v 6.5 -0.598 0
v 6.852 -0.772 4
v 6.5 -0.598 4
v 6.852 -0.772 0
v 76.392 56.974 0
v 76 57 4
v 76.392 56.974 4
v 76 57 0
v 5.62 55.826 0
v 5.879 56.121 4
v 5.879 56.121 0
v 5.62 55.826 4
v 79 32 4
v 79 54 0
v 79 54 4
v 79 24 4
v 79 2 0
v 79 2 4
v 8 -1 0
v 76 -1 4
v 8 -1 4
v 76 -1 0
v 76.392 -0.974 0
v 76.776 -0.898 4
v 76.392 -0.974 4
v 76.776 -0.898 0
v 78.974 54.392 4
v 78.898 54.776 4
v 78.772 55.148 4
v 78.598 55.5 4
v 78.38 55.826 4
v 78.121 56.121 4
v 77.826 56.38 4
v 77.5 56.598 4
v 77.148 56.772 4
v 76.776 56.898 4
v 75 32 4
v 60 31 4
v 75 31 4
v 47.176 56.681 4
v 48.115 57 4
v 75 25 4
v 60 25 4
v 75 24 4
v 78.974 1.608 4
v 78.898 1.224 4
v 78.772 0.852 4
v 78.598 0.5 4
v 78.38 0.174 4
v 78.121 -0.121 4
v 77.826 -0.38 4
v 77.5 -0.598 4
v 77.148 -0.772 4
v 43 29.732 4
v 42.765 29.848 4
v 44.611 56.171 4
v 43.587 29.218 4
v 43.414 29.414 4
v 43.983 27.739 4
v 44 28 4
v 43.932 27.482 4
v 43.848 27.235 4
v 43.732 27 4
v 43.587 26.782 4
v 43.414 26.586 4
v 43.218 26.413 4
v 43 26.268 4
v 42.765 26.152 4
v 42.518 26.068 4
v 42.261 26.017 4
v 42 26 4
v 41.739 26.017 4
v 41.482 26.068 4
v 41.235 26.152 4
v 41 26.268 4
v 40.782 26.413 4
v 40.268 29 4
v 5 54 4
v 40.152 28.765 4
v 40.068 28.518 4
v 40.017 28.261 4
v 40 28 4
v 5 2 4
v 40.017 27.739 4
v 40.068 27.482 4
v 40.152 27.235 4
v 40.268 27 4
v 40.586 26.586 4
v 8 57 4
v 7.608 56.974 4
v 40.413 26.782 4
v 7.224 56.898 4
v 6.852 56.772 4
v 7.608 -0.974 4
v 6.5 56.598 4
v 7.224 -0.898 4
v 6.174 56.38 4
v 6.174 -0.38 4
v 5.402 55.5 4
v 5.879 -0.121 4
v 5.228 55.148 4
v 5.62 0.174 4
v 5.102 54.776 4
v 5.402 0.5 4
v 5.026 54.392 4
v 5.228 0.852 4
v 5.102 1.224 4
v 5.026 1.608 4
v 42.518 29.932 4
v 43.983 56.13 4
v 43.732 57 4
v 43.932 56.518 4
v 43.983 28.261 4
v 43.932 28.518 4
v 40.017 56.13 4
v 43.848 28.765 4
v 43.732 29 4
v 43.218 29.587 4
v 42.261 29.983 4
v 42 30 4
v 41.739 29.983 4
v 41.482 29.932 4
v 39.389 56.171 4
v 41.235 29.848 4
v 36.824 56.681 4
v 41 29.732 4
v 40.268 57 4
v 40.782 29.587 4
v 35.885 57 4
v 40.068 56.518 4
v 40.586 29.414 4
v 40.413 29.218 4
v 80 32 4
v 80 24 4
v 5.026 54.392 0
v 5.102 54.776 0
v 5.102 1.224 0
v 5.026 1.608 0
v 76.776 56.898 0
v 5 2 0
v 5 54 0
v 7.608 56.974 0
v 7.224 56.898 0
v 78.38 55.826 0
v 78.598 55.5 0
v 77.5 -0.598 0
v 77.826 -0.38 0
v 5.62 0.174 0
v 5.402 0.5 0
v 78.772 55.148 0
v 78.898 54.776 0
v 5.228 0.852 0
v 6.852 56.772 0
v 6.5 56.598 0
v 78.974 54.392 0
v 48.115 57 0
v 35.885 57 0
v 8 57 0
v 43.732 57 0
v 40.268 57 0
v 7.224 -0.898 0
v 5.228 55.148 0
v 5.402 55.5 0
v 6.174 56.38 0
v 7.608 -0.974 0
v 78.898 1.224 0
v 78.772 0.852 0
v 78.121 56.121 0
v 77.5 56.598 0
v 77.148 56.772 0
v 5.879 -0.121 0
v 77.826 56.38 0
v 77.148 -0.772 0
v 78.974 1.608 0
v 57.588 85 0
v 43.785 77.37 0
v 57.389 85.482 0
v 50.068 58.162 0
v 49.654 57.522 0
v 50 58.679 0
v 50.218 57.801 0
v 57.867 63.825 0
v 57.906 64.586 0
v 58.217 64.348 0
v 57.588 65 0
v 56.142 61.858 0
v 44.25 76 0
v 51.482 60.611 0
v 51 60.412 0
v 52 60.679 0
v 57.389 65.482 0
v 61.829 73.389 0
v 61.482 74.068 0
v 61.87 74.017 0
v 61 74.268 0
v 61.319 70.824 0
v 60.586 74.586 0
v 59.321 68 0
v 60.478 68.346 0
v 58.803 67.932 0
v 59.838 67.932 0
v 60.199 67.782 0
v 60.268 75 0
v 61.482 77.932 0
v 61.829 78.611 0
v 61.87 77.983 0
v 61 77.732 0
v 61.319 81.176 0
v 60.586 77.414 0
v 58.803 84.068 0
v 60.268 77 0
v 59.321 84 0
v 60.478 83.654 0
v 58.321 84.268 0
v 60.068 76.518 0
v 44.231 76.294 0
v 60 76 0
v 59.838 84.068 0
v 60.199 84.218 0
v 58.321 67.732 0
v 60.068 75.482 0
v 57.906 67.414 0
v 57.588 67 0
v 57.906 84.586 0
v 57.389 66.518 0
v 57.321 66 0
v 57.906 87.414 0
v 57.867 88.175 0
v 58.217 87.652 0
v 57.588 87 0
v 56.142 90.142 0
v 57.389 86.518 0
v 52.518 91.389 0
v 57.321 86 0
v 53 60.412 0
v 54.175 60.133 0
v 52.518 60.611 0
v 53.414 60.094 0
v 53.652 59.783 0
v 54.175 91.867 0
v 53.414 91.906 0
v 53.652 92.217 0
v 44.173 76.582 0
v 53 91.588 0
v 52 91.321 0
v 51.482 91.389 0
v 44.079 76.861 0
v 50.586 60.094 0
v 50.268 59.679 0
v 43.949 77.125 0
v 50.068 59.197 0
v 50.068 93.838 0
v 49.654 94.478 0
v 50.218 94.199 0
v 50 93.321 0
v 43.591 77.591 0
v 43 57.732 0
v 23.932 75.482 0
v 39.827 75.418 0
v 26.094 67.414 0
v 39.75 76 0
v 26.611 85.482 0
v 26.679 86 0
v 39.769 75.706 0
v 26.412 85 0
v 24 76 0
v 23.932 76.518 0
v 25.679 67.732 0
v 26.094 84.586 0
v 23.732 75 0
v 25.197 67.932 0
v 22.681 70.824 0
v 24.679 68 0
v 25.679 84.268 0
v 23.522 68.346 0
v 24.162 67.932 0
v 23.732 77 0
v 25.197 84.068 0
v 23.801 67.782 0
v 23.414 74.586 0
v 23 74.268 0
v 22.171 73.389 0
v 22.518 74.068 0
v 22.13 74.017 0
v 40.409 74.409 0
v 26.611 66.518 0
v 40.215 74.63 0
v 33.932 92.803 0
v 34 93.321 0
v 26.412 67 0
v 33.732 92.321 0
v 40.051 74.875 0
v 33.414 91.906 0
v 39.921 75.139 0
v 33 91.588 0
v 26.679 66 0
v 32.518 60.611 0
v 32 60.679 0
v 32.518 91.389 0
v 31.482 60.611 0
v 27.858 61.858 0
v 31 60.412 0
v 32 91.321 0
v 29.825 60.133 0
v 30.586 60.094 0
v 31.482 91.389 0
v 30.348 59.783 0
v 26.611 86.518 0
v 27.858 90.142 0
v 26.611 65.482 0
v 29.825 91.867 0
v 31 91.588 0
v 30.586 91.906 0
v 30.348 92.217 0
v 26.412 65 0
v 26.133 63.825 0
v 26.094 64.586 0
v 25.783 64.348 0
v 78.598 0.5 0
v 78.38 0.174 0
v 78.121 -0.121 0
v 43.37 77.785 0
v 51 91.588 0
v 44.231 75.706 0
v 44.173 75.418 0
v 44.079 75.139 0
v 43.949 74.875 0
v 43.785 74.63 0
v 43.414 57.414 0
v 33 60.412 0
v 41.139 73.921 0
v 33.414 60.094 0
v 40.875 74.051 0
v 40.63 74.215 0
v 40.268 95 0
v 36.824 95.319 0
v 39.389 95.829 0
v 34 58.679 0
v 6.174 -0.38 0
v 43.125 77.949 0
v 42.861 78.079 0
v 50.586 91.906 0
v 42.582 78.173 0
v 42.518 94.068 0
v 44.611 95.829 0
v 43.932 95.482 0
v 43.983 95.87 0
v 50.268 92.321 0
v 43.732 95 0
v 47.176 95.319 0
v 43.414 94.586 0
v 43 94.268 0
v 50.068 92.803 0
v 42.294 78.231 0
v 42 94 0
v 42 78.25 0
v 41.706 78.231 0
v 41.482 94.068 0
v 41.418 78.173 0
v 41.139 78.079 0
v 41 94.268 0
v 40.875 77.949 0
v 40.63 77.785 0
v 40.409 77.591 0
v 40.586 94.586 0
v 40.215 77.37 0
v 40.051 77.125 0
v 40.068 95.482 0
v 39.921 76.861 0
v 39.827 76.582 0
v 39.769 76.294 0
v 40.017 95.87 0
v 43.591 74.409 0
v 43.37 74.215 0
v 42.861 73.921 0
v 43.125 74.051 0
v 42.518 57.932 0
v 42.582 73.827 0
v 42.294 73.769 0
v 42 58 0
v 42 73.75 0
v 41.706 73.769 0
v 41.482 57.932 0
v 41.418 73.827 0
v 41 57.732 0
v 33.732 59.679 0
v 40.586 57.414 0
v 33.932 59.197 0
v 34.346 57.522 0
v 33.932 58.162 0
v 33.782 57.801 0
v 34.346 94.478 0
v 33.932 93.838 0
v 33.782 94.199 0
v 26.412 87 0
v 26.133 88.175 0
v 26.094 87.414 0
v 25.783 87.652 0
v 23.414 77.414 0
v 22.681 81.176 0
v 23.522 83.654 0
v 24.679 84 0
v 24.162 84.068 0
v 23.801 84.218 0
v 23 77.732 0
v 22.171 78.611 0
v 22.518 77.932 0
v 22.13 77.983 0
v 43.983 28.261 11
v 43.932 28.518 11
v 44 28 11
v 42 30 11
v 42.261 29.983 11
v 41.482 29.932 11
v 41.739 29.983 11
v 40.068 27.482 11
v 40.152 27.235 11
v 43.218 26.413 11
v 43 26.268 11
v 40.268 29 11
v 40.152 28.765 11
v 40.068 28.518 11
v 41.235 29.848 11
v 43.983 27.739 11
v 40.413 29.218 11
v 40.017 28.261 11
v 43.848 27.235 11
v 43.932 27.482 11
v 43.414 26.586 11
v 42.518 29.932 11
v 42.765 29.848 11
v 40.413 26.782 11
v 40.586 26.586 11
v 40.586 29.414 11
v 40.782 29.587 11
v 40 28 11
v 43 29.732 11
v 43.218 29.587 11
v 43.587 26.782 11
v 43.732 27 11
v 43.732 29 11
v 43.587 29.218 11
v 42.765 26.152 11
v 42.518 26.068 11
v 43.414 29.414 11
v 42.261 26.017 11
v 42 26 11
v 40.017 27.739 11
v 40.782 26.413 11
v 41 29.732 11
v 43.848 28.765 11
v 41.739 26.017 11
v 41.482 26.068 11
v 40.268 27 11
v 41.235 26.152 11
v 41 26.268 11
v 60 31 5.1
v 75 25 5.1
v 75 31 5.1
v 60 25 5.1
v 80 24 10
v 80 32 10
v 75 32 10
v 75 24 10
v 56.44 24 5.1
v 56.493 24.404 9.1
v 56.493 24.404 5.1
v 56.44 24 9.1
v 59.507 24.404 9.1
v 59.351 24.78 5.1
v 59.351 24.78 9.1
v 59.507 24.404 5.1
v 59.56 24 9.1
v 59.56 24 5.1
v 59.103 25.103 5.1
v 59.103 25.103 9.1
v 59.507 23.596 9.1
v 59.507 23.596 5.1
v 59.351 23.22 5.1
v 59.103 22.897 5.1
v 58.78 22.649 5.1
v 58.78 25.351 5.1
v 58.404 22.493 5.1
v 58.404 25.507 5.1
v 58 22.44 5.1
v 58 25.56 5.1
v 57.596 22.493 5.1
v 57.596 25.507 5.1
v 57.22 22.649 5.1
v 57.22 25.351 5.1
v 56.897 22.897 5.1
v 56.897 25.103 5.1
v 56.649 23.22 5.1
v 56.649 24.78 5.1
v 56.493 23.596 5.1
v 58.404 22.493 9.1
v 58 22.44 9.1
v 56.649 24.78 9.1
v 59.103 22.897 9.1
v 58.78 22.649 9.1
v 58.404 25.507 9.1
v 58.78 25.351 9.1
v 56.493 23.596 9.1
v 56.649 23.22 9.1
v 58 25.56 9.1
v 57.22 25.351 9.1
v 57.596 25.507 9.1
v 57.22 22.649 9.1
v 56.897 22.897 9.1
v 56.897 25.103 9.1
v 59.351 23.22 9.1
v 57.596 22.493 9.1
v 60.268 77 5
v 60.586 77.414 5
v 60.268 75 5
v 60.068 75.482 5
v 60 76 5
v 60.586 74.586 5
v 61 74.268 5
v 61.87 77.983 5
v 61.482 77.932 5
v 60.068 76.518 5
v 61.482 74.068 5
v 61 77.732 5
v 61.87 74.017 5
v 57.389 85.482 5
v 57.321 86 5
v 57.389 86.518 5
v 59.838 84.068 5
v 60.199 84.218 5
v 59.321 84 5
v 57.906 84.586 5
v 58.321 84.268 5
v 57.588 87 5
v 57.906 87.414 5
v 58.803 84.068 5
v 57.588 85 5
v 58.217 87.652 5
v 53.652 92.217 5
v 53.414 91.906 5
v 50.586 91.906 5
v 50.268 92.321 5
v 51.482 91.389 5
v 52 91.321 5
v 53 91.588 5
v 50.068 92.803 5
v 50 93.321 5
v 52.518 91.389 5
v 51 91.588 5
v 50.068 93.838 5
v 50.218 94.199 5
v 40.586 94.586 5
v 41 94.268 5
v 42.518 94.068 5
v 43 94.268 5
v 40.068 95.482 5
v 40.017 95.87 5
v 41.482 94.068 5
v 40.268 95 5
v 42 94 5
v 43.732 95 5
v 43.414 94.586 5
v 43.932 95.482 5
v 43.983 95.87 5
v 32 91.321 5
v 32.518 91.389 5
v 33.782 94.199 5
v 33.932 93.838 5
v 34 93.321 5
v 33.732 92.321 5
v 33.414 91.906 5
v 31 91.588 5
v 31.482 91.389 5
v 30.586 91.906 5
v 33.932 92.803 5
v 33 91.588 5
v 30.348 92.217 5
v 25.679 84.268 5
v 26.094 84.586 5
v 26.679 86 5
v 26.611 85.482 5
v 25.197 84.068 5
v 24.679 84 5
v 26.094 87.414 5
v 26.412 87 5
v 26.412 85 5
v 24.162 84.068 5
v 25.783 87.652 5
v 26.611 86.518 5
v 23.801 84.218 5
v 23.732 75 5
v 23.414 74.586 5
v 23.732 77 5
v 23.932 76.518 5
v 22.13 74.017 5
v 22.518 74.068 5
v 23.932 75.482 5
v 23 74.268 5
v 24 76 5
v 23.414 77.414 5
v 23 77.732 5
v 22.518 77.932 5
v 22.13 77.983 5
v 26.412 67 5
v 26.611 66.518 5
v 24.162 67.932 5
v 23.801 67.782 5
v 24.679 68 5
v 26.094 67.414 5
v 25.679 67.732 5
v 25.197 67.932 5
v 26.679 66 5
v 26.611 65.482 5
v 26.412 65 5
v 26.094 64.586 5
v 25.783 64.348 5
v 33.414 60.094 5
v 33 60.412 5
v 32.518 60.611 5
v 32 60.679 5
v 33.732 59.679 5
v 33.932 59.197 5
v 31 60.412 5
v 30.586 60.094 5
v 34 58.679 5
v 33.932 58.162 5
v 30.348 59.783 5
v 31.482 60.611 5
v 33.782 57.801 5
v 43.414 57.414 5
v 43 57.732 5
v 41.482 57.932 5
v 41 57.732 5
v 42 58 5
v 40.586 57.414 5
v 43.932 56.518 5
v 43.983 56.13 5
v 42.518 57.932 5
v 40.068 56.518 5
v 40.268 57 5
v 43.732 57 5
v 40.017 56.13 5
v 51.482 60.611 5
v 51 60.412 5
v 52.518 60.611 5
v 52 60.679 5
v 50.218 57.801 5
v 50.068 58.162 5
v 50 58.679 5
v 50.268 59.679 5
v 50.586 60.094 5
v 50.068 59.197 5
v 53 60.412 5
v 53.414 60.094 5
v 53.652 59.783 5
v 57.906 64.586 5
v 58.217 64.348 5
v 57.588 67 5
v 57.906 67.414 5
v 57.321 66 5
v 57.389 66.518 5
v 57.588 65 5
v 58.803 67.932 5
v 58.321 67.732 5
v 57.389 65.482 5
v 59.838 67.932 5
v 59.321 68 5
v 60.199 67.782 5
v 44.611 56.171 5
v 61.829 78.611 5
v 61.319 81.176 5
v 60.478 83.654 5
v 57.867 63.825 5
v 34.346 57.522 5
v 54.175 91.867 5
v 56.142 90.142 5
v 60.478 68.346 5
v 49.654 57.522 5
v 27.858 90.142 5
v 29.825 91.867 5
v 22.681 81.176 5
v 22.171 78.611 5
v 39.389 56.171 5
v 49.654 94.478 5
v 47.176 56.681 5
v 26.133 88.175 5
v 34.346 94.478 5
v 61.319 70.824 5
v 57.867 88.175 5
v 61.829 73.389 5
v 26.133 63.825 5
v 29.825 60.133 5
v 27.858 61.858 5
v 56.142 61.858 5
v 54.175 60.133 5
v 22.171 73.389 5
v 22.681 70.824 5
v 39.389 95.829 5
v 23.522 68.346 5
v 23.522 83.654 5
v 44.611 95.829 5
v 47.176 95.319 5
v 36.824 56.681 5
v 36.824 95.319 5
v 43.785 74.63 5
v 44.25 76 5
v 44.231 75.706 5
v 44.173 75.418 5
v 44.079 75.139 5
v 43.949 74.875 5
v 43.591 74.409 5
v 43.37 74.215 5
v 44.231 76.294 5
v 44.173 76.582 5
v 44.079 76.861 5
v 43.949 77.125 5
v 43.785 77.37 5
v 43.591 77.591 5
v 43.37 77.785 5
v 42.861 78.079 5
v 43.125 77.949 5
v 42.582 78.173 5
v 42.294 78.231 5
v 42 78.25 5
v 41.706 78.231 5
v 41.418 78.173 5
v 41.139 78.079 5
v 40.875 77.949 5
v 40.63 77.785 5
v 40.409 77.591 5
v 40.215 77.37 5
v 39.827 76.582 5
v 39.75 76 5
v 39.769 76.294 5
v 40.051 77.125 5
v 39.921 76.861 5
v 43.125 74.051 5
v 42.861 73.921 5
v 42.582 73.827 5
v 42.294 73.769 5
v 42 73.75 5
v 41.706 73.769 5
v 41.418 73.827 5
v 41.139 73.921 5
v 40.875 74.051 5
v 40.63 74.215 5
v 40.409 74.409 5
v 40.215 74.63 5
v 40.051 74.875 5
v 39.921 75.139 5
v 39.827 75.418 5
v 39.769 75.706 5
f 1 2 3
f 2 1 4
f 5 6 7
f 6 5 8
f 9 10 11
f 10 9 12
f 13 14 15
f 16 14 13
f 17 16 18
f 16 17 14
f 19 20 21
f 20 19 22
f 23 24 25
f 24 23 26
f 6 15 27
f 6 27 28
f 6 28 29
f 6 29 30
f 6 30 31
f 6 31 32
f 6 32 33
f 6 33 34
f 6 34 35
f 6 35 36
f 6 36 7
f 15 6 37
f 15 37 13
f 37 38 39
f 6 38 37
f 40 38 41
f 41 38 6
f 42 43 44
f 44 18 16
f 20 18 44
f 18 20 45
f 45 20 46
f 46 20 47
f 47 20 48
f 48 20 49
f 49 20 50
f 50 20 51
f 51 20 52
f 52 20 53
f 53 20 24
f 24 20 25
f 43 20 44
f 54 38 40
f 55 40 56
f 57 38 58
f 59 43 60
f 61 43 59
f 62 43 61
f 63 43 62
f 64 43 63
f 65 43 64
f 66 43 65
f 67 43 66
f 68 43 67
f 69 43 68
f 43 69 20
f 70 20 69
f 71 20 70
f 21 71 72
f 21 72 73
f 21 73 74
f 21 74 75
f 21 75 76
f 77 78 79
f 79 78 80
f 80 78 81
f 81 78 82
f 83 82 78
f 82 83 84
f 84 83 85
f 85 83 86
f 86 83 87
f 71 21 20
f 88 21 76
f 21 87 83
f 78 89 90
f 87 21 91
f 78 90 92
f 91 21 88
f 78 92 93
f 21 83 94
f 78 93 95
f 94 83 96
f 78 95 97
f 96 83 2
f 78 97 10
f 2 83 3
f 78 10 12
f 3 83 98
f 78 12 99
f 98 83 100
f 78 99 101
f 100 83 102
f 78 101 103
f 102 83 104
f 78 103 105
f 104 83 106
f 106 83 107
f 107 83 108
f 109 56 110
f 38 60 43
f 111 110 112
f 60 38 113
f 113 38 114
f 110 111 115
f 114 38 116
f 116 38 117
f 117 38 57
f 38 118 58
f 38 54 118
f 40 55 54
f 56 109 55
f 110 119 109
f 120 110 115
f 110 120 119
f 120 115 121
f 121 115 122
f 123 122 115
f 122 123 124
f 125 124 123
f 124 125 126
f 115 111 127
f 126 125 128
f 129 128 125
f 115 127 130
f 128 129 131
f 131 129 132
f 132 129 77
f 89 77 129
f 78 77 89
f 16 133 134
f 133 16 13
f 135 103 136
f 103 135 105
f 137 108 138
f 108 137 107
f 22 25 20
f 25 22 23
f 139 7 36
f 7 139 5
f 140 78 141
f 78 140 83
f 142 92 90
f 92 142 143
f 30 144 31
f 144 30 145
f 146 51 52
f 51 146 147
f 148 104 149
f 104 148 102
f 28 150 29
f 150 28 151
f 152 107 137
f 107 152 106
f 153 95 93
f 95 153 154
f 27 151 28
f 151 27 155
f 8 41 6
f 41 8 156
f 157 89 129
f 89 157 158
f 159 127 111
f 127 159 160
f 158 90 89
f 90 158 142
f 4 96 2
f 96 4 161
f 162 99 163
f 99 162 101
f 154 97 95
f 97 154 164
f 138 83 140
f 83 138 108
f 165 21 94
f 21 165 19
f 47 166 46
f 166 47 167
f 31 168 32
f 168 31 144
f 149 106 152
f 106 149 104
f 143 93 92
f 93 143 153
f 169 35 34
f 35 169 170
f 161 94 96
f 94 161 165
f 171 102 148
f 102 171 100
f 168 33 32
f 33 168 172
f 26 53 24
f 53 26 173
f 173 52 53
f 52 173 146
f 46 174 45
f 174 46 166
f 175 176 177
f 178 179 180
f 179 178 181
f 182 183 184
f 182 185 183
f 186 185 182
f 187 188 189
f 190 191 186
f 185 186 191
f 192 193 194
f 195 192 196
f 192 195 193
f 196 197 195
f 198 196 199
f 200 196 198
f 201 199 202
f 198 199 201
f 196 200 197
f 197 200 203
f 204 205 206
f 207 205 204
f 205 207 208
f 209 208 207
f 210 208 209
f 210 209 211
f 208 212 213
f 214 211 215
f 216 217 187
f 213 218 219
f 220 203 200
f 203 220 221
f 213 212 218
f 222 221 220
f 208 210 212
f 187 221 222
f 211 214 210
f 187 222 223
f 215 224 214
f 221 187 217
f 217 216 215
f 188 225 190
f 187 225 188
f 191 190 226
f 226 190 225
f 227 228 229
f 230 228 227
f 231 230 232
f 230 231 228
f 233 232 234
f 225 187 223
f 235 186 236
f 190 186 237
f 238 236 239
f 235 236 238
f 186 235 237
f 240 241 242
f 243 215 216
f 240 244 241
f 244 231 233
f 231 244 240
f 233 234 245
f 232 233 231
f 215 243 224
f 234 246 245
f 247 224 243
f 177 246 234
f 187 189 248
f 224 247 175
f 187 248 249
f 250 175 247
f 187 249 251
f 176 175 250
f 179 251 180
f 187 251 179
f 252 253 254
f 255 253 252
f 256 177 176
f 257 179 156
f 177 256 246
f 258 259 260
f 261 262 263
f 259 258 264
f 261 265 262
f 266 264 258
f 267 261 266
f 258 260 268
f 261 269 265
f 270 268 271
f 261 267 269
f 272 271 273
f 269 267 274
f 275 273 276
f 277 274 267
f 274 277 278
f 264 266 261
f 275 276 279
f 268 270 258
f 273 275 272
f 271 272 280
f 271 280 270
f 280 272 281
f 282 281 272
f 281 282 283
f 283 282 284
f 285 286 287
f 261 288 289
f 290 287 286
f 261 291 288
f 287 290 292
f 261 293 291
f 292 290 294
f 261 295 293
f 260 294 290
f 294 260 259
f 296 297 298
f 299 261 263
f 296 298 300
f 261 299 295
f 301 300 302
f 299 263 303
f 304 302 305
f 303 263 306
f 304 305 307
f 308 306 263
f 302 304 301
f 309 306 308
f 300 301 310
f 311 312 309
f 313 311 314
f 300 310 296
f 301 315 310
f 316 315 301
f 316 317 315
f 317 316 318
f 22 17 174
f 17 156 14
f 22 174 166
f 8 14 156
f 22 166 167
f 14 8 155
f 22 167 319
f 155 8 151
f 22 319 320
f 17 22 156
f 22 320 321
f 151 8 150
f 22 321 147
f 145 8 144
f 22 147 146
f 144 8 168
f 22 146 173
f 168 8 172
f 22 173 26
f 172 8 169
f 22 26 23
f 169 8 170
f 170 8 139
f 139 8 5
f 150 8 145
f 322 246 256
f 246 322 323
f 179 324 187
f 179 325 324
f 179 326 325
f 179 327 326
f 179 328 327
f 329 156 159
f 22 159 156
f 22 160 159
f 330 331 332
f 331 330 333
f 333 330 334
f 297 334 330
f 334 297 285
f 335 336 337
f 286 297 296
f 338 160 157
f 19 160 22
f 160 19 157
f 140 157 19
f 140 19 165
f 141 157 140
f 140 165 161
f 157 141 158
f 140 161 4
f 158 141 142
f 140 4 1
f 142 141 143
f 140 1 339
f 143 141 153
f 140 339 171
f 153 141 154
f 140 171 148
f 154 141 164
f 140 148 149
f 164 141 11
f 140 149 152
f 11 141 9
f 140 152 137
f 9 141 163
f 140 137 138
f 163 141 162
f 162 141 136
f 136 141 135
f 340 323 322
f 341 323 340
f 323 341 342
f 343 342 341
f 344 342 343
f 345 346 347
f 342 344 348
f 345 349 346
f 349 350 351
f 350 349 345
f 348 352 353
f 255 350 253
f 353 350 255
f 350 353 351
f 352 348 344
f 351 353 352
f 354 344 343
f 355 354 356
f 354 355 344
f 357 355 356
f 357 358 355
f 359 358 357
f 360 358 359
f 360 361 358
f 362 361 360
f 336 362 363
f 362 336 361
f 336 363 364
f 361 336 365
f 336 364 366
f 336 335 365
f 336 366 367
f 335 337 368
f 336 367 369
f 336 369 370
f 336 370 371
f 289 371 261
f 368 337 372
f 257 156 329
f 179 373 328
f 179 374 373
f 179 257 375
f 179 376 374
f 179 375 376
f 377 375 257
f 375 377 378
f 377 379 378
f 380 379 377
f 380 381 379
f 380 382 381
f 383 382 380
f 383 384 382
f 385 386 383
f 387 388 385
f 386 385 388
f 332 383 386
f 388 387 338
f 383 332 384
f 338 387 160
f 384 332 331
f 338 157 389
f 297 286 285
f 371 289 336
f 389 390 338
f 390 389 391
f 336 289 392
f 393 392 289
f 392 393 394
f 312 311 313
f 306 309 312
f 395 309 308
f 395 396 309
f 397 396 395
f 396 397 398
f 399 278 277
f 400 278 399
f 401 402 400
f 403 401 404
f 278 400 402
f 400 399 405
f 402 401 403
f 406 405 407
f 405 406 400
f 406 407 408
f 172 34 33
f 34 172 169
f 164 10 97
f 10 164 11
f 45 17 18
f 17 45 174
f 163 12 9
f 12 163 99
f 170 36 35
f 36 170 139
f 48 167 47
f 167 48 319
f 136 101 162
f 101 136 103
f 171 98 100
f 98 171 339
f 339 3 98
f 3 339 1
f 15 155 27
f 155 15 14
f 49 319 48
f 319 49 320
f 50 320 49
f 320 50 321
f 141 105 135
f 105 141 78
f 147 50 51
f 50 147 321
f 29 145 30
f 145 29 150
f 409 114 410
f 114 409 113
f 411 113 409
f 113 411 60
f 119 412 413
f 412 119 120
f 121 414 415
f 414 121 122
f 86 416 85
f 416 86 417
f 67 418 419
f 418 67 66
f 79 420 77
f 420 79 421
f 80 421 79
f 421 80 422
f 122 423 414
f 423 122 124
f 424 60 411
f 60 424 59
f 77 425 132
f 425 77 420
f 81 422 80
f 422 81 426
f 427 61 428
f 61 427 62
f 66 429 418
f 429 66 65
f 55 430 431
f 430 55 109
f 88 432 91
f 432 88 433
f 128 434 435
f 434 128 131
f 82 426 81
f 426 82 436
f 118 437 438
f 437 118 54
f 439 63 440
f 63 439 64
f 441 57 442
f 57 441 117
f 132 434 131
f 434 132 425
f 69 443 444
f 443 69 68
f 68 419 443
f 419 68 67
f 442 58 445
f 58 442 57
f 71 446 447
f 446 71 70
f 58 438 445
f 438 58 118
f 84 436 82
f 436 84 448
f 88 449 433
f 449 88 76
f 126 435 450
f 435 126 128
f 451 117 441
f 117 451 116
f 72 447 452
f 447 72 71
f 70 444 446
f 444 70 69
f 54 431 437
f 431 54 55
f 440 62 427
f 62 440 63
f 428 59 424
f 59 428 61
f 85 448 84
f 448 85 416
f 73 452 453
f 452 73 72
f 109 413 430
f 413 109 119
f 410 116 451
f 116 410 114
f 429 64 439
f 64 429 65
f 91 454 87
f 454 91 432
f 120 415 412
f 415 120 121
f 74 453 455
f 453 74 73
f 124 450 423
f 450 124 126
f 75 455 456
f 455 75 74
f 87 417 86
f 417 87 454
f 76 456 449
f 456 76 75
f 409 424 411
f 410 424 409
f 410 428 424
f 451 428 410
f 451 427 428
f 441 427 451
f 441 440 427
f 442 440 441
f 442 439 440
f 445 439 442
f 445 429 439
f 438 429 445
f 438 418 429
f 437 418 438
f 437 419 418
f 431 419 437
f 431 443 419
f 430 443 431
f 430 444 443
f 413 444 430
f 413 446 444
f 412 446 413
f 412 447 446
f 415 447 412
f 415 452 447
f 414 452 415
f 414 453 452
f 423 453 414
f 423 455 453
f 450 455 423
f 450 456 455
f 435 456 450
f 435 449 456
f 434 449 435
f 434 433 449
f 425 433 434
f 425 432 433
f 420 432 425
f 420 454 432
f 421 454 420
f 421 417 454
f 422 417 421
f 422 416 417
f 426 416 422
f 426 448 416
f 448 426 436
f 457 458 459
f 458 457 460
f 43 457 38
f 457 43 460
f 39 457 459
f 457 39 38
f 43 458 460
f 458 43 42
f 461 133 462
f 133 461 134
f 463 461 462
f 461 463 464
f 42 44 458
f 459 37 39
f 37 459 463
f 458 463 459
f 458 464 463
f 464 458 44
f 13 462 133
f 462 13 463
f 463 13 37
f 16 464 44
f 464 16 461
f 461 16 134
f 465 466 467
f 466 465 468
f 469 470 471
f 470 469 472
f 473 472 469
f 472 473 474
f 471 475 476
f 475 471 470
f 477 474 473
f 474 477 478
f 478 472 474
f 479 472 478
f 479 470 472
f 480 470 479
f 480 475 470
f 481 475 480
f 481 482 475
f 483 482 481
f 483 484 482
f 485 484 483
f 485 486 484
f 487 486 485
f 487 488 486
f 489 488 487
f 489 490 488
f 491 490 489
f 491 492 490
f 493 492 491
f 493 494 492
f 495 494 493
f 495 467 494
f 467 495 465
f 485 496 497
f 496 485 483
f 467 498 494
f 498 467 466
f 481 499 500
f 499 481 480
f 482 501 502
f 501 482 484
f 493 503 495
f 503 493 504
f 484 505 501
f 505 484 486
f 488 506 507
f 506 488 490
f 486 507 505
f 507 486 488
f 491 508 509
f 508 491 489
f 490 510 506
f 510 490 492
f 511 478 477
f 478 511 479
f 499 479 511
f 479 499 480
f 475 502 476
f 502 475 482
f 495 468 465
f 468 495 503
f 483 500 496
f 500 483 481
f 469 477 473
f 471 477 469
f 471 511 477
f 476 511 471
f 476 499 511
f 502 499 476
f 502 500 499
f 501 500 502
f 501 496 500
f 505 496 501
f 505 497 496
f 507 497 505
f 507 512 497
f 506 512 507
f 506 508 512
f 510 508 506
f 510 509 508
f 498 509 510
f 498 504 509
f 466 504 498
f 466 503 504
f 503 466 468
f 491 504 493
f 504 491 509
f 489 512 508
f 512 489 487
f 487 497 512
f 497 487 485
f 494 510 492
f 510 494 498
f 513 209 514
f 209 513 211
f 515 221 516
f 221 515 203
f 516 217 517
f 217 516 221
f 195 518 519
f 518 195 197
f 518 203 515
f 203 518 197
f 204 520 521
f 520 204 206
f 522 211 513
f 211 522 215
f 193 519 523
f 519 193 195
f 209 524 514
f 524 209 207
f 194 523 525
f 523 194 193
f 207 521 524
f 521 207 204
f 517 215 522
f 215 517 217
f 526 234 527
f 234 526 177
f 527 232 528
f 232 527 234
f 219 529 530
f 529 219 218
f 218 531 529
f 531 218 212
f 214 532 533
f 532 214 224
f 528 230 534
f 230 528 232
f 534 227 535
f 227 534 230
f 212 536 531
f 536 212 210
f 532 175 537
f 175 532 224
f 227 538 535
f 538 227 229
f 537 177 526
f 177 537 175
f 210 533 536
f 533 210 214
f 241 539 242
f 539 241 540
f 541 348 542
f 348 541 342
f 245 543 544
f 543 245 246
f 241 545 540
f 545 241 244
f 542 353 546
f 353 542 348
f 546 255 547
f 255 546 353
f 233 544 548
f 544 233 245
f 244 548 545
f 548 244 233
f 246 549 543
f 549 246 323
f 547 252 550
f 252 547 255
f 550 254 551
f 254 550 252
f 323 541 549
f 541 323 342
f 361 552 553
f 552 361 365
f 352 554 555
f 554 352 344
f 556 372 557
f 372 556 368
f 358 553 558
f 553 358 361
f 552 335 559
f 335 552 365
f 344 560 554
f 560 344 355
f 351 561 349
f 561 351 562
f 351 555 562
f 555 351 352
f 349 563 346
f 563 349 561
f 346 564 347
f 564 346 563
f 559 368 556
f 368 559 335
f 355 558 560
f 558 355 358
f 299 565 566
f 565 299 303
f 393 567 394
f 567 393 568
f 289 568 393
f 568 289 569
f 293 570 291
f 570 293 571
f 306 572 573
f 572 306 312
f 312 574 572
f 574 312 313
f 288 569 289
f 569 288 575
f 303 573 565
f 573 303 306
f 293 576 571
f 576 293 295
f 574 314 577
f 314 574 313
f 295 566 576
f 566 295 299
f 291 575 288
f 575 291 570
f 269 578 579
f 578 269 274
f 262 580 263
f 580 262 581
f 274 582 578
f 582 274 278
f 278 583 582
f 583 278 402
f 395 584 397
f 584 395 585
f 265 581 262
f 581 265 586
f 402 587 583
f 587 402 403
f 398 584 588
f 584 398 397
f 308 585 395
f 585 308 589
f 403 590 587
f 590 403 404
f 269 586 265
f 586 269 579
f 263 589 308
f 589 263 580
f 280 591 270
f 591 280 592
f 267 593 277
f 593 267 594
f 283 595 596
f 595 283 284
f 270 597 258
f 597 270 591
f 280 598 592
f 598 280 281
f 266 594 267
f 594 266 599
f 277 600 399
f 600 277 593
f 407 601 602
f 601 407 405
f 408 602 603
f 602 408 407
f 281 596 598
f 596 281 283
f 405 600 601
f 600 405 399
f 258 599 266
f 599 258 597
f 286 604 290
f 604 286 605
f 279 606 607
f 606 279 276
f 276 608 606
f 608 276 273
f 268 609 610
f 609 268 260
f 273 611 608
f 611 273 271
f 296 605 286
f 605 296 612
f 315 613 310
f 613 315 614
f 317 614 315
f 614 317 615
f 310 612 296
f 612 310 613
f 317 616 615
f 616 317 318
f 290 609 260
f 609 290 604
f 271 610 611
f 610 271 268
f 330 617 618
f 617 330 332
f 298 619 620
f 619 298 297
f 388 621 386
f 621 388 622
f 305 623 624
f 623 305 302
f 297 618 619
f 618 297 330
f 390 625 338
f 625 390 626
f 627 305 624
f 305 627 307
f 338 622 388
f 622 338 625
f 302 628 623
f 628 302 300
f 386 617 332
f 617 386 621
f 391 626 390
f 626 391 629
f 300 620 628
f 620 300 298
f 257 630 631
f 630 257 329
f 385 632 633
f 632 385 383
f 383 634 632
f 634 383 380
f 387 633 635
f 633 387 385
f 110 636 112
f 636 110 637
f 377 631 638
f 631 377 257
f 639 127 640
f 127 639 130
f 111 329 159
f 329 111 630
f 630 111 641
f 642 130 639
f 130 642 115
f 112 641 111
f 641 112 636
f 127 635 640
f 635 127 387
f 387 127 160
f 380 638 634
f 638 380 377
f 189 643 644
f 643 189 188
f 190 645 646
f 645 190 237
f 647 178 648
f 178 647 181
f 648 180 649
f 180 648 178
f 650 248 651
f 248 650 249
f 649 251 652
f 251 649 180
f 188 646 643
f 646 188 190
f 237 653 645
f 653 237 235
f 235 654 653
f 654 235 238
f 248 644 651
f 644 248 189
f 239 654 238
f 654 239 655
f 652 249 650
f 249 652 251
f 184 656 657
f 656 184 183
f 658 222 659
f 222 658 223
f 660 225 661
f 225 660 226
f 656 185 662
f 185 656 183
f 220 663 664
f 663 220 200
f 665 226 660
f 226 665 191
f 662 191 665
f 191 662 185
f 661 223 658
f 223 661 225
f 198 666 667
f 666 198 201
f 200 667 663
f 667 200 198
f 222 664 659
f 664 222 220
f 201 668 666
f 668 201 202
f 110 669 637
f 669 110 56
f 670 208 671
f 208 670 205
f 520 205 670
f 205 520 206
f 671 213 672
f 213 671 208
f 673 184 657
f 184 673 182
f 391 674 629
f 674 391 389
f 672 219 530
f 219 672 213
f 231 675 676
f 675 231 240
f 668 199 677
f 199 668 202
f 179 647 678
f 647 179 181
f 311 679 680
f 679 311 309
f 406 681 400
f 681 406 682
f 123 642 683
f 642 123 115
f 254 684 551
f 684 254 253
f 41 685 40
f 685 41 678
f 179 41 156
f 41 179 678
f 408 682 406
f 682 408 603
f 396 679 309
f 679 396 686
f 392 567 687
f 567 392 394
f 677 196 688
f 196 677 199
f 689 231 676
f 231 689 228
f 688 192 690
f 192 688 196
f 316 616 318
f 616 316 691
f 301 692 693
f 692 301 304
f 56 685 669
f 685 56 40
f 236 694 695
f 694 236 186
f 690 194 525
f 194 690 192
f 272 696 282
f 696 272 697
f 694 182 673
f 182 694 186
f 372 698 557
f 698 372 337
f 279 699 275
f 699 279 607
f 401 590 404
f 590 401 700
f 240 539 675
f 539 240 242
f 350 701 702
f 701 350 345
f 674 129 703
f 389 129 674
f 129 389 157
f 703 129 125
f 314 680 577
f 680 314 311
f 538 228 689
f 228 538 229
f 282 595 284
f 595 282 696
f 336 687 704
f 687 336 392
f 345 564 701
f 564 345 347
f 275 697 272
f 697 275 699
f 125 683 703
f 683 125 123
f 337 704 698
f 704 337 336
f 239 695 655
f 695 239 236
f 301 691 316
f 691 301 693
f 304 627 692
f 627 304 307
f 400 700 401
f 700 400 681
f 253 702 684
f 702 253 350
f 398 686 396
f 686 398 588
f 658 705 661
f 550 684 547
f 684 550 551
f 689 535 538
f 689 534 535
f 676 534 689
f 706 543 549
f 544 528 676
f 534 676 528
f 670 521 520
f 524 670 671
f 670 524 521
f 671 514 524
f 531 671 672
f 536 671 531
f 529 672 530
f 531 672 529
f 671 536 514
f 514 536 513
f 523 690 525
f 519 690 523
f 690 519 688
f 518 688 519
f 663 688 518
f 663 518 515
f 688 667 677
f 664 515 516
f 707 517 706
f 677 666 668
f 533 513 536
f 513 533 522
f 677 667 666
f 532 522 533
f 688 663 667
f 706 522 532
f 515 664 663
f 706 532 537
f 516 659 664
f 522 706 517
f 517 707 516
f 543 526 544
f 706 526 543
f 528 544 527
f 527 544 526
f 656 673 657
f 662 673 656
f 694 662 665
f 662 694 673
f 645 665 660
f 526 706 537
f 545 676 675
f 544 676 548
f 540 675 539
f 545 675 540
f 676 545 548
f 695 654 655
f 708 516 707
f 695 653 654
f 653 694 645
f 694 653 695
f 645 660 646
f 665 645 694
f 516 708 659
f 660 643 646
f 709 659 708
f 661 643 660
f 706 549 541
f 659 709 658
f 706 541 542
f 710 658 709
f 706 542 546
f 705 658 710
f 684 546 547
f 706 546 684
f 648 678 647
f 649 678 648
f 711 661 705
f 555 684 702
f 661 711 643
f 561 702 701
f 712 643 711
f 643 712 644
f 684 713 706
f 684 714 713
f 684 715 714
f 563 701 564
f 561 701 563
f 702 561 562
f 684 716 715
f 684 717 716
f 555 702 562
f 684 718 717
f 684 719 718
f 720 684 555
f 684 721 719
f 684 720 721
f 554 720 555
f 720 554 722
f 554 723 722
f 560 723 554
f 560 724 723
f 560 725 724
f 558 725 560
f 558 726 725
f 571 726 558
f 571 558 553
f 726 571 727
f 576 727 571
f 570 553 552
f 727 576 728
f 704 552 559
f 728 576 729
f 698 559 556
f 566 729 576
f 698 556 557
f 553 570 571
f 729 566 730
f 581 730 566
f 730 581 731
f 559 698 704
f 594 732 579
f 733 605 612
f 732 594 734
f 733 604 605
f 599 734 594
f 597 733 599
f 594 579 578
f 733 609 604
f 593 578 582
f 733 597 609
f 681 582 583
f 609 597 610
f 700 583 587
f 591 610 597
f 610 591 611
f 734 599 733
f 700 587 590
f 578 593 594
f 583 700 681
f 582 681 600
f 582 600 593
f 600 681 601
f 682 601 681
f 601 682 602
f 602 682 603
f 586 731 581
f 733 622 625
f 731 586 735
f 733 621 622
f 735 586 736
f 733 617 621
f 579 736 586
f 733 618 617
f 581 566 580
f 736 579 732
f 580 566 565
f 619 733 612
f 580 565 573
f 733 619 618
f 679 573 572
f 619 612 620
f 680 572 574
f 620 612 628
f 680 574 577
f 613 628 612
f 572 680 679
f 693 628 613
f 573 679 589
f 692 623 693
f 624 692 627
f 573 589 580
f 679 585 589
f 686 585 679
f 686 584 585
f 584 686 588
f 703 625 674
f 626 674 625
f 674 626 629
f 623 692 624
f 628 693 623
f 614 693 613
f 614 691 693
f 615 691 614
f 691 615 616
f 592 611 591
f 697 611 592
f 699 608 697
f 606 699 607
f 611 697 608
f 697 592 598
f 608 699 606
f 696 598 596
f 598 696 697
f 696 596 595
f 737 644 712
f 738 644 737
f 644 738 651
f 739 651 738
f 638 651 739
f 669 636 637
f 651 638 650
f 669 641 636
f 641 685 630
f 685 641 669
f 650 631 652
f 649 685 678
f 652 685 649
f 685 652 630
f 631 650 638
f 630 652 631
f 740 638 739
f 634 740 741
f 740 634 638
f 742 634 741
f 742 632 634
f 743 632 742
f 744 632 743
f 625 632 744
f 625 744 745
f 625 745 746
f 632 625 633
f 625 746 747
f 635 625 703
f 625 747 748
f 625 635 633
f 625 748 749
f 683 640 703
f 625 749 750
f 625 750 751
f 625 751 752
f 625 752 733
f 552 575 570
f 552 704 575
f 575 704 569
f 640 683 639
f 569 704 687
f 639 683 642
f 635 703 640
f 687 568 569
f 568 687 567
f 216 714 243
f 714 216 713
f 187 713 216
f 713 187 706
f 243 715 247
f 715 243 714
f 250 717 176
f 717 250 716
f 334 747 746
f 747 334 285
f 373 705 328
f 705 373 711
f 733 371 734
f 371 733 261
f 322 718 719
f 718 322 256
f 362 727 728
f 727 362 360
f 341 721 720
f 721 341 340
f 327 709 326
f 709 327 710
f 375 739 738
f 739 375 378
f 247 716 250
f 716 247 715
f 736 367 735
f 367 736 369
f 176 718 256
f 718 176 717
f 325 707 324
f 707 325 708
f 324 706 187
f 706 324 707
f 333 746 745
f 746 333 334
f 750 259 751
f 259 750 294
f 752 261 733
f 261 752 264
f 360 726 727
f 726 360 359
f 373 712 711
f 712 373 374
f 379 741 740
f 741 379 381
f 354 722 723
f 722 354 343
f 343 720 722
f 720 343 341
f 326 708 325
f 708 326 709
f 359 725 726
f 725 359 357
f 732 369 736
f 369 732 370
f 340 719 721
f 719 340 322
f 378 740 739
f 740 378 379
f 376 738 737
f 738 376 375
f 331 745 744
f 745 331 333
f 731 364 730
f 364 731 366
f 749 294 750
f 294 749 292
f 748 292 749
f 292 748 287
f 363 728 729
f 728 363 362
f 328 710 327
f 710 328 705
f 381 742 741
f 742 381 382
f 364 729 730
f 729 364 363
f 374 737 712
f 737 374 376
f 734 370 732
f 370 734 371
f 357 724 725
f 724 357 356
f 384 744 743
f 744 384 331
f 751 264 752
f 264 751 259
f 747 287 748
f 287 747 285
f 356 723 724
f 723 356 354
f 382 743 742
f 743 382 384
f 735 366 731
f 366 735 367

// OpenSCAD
/*
Sample 106: Dreh-Rastindexierung — 12 Positionen
Generated from the FDM Mechanical Sample Library.
Units: millimetres.

Override examples:
  openscad -o custom.stl -D 'view="plate"' -D 'render_fn=64' model.scad
  openscad -o preview.png -D 'view="assembly"' model.scad
*/
use <../../../library/fdm_mechanisms.scad>

render_fn = is_undef(render_fn) ? 48 : render_fn;
view = is_undef(view) ? "plate" : view;
$fn = render_fn;

sample_detent_indexer(
    view=view,
    notches=12,
    beam_t=1.1,
    clearance=0.25
);
